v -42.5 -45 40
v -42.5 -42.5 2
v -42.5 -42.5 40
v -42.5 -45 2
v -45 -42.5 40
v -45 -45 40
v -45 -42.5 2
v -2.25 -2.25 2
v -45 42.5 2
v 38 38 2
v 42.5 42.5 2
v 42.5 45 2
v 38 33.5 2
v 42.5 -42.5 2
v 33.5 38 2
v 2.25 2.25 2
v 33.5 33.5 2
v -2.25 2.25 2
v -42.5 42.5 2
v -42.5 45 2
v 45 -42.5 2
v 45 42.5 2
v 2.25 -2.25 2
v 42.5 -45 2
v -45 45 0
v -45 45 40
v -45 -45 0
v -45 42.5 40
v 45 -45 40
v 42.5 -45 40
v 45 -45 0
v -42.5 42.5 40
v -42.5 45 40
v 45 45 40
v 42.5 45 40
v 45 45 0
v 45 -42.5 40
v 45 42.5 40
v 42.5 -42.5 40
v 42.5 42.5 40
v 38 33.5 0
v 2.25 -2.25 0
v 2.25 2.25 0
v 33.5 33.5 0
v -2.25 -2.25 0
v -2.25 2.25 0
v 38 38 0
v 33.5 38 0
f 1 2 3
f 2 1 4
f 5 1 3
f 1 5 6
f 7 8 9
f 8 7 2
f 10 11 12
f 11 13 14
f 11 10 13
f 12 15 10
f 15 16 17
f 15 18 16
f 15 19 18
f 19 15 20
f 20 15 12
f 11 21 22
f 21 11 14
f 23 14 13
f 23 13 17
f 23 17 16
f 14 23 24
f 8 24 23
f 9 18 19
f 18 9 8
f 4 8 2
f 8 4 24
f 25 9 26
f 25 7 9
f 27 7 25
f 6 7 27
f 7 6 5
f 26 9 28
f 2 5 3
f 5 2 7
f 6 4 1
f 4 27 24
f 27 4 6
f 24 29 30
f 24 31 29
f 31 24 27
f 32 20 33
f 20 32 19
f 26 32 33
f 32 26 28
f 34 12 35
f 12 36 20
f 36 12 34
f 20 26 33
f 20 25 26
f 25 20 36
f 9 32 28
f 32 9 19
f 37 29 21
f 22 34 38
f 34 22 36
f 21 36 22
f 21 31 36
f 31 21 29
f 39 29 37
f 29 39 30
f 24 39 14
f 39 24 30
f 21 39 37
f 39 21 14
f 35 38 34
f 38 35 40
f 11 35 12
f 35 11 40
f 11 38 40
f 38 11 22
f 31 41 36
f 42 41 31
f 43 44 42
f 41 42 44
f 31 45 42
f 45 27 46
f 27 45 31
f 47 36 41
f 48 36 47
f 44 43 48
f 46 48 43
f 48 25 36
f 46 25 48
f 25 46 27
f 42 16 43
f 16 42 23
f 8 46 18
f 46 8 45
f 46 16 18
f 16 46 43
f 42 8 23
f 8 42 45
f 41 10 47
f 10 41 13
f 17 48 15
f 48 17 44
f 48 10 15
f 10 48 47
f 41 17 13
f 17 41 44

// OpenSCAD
// DIY magnetic stirrer housing for 80 mm PC case fan
// Print orientation: upside-down open box, top plate on bed (z = 0 to 2)

// ---------- Parameters ----------
top_thickness      = 2;     // top plate thickness
wall_thickness     = 2.5;   // wall thickness
box_height         = 40;    // total height of walls (z = 0 to 40)
outer_size         = 90;    // outer size in X and Y
screw_hole_count   = 4;     // number of M4 screw holes
screw_hole_d       = 4.5;   // screw hole diameter
screw_hole_pitch   = 71.5;  // square pattern pitch between holes
cable_notch_w      = 12;    // cable notch width
cable_notch_depth  = 8;     // notch depth from open edge (z = 32 to 40)
eps                = 0.5;   // overcut for clean differences
$fn                = 96;    // curve resolution

// ---------- Model ----------
difference() {
    union() {
        // Top plate
        translate([-outer_size/2, -outer_size/2, 0])
            cube([outer_size, outer_size, top_thickness]);

        // Walls, open top
        for (sx = [-1, 1], sy = [-1, 1])
            translate([sx > 0 ? outer_size/2 - wall_thickness : -outer_size/2,
                       sy > 0 ? outer_size/2 - wall_thickness : -outer_size/2,
                       top_thickness])
                cube([wall_thickness, wall_thickness, box_height - top_thickness]);
    }

    // Screw holes through top plate
    for (i = [0 : screw_hole_count - 1]) {
        a = i < 2 ? i * screw_hole_pitch : (3 - i) * screw_hole_pitch;
        translate([a/2 - screw_hole_d/2, a/2 - screw_hole_d/2, -eps])
            cube([screw_hole_d, screw_hole_d, top_thickness + 2*eps]);
    }

    // Cable notch in one wall (reaches open edge)
    translate([outer_size/2 - wall_thickness - cable_notch_w/2,
               outer_size/2 - wall_thickness - cable_notch_w/2,
               top_thickness + box_height - cable_notch_depth])
        cube([cable_notch_w, wall_thickness, cable_notch_depth]);
}
